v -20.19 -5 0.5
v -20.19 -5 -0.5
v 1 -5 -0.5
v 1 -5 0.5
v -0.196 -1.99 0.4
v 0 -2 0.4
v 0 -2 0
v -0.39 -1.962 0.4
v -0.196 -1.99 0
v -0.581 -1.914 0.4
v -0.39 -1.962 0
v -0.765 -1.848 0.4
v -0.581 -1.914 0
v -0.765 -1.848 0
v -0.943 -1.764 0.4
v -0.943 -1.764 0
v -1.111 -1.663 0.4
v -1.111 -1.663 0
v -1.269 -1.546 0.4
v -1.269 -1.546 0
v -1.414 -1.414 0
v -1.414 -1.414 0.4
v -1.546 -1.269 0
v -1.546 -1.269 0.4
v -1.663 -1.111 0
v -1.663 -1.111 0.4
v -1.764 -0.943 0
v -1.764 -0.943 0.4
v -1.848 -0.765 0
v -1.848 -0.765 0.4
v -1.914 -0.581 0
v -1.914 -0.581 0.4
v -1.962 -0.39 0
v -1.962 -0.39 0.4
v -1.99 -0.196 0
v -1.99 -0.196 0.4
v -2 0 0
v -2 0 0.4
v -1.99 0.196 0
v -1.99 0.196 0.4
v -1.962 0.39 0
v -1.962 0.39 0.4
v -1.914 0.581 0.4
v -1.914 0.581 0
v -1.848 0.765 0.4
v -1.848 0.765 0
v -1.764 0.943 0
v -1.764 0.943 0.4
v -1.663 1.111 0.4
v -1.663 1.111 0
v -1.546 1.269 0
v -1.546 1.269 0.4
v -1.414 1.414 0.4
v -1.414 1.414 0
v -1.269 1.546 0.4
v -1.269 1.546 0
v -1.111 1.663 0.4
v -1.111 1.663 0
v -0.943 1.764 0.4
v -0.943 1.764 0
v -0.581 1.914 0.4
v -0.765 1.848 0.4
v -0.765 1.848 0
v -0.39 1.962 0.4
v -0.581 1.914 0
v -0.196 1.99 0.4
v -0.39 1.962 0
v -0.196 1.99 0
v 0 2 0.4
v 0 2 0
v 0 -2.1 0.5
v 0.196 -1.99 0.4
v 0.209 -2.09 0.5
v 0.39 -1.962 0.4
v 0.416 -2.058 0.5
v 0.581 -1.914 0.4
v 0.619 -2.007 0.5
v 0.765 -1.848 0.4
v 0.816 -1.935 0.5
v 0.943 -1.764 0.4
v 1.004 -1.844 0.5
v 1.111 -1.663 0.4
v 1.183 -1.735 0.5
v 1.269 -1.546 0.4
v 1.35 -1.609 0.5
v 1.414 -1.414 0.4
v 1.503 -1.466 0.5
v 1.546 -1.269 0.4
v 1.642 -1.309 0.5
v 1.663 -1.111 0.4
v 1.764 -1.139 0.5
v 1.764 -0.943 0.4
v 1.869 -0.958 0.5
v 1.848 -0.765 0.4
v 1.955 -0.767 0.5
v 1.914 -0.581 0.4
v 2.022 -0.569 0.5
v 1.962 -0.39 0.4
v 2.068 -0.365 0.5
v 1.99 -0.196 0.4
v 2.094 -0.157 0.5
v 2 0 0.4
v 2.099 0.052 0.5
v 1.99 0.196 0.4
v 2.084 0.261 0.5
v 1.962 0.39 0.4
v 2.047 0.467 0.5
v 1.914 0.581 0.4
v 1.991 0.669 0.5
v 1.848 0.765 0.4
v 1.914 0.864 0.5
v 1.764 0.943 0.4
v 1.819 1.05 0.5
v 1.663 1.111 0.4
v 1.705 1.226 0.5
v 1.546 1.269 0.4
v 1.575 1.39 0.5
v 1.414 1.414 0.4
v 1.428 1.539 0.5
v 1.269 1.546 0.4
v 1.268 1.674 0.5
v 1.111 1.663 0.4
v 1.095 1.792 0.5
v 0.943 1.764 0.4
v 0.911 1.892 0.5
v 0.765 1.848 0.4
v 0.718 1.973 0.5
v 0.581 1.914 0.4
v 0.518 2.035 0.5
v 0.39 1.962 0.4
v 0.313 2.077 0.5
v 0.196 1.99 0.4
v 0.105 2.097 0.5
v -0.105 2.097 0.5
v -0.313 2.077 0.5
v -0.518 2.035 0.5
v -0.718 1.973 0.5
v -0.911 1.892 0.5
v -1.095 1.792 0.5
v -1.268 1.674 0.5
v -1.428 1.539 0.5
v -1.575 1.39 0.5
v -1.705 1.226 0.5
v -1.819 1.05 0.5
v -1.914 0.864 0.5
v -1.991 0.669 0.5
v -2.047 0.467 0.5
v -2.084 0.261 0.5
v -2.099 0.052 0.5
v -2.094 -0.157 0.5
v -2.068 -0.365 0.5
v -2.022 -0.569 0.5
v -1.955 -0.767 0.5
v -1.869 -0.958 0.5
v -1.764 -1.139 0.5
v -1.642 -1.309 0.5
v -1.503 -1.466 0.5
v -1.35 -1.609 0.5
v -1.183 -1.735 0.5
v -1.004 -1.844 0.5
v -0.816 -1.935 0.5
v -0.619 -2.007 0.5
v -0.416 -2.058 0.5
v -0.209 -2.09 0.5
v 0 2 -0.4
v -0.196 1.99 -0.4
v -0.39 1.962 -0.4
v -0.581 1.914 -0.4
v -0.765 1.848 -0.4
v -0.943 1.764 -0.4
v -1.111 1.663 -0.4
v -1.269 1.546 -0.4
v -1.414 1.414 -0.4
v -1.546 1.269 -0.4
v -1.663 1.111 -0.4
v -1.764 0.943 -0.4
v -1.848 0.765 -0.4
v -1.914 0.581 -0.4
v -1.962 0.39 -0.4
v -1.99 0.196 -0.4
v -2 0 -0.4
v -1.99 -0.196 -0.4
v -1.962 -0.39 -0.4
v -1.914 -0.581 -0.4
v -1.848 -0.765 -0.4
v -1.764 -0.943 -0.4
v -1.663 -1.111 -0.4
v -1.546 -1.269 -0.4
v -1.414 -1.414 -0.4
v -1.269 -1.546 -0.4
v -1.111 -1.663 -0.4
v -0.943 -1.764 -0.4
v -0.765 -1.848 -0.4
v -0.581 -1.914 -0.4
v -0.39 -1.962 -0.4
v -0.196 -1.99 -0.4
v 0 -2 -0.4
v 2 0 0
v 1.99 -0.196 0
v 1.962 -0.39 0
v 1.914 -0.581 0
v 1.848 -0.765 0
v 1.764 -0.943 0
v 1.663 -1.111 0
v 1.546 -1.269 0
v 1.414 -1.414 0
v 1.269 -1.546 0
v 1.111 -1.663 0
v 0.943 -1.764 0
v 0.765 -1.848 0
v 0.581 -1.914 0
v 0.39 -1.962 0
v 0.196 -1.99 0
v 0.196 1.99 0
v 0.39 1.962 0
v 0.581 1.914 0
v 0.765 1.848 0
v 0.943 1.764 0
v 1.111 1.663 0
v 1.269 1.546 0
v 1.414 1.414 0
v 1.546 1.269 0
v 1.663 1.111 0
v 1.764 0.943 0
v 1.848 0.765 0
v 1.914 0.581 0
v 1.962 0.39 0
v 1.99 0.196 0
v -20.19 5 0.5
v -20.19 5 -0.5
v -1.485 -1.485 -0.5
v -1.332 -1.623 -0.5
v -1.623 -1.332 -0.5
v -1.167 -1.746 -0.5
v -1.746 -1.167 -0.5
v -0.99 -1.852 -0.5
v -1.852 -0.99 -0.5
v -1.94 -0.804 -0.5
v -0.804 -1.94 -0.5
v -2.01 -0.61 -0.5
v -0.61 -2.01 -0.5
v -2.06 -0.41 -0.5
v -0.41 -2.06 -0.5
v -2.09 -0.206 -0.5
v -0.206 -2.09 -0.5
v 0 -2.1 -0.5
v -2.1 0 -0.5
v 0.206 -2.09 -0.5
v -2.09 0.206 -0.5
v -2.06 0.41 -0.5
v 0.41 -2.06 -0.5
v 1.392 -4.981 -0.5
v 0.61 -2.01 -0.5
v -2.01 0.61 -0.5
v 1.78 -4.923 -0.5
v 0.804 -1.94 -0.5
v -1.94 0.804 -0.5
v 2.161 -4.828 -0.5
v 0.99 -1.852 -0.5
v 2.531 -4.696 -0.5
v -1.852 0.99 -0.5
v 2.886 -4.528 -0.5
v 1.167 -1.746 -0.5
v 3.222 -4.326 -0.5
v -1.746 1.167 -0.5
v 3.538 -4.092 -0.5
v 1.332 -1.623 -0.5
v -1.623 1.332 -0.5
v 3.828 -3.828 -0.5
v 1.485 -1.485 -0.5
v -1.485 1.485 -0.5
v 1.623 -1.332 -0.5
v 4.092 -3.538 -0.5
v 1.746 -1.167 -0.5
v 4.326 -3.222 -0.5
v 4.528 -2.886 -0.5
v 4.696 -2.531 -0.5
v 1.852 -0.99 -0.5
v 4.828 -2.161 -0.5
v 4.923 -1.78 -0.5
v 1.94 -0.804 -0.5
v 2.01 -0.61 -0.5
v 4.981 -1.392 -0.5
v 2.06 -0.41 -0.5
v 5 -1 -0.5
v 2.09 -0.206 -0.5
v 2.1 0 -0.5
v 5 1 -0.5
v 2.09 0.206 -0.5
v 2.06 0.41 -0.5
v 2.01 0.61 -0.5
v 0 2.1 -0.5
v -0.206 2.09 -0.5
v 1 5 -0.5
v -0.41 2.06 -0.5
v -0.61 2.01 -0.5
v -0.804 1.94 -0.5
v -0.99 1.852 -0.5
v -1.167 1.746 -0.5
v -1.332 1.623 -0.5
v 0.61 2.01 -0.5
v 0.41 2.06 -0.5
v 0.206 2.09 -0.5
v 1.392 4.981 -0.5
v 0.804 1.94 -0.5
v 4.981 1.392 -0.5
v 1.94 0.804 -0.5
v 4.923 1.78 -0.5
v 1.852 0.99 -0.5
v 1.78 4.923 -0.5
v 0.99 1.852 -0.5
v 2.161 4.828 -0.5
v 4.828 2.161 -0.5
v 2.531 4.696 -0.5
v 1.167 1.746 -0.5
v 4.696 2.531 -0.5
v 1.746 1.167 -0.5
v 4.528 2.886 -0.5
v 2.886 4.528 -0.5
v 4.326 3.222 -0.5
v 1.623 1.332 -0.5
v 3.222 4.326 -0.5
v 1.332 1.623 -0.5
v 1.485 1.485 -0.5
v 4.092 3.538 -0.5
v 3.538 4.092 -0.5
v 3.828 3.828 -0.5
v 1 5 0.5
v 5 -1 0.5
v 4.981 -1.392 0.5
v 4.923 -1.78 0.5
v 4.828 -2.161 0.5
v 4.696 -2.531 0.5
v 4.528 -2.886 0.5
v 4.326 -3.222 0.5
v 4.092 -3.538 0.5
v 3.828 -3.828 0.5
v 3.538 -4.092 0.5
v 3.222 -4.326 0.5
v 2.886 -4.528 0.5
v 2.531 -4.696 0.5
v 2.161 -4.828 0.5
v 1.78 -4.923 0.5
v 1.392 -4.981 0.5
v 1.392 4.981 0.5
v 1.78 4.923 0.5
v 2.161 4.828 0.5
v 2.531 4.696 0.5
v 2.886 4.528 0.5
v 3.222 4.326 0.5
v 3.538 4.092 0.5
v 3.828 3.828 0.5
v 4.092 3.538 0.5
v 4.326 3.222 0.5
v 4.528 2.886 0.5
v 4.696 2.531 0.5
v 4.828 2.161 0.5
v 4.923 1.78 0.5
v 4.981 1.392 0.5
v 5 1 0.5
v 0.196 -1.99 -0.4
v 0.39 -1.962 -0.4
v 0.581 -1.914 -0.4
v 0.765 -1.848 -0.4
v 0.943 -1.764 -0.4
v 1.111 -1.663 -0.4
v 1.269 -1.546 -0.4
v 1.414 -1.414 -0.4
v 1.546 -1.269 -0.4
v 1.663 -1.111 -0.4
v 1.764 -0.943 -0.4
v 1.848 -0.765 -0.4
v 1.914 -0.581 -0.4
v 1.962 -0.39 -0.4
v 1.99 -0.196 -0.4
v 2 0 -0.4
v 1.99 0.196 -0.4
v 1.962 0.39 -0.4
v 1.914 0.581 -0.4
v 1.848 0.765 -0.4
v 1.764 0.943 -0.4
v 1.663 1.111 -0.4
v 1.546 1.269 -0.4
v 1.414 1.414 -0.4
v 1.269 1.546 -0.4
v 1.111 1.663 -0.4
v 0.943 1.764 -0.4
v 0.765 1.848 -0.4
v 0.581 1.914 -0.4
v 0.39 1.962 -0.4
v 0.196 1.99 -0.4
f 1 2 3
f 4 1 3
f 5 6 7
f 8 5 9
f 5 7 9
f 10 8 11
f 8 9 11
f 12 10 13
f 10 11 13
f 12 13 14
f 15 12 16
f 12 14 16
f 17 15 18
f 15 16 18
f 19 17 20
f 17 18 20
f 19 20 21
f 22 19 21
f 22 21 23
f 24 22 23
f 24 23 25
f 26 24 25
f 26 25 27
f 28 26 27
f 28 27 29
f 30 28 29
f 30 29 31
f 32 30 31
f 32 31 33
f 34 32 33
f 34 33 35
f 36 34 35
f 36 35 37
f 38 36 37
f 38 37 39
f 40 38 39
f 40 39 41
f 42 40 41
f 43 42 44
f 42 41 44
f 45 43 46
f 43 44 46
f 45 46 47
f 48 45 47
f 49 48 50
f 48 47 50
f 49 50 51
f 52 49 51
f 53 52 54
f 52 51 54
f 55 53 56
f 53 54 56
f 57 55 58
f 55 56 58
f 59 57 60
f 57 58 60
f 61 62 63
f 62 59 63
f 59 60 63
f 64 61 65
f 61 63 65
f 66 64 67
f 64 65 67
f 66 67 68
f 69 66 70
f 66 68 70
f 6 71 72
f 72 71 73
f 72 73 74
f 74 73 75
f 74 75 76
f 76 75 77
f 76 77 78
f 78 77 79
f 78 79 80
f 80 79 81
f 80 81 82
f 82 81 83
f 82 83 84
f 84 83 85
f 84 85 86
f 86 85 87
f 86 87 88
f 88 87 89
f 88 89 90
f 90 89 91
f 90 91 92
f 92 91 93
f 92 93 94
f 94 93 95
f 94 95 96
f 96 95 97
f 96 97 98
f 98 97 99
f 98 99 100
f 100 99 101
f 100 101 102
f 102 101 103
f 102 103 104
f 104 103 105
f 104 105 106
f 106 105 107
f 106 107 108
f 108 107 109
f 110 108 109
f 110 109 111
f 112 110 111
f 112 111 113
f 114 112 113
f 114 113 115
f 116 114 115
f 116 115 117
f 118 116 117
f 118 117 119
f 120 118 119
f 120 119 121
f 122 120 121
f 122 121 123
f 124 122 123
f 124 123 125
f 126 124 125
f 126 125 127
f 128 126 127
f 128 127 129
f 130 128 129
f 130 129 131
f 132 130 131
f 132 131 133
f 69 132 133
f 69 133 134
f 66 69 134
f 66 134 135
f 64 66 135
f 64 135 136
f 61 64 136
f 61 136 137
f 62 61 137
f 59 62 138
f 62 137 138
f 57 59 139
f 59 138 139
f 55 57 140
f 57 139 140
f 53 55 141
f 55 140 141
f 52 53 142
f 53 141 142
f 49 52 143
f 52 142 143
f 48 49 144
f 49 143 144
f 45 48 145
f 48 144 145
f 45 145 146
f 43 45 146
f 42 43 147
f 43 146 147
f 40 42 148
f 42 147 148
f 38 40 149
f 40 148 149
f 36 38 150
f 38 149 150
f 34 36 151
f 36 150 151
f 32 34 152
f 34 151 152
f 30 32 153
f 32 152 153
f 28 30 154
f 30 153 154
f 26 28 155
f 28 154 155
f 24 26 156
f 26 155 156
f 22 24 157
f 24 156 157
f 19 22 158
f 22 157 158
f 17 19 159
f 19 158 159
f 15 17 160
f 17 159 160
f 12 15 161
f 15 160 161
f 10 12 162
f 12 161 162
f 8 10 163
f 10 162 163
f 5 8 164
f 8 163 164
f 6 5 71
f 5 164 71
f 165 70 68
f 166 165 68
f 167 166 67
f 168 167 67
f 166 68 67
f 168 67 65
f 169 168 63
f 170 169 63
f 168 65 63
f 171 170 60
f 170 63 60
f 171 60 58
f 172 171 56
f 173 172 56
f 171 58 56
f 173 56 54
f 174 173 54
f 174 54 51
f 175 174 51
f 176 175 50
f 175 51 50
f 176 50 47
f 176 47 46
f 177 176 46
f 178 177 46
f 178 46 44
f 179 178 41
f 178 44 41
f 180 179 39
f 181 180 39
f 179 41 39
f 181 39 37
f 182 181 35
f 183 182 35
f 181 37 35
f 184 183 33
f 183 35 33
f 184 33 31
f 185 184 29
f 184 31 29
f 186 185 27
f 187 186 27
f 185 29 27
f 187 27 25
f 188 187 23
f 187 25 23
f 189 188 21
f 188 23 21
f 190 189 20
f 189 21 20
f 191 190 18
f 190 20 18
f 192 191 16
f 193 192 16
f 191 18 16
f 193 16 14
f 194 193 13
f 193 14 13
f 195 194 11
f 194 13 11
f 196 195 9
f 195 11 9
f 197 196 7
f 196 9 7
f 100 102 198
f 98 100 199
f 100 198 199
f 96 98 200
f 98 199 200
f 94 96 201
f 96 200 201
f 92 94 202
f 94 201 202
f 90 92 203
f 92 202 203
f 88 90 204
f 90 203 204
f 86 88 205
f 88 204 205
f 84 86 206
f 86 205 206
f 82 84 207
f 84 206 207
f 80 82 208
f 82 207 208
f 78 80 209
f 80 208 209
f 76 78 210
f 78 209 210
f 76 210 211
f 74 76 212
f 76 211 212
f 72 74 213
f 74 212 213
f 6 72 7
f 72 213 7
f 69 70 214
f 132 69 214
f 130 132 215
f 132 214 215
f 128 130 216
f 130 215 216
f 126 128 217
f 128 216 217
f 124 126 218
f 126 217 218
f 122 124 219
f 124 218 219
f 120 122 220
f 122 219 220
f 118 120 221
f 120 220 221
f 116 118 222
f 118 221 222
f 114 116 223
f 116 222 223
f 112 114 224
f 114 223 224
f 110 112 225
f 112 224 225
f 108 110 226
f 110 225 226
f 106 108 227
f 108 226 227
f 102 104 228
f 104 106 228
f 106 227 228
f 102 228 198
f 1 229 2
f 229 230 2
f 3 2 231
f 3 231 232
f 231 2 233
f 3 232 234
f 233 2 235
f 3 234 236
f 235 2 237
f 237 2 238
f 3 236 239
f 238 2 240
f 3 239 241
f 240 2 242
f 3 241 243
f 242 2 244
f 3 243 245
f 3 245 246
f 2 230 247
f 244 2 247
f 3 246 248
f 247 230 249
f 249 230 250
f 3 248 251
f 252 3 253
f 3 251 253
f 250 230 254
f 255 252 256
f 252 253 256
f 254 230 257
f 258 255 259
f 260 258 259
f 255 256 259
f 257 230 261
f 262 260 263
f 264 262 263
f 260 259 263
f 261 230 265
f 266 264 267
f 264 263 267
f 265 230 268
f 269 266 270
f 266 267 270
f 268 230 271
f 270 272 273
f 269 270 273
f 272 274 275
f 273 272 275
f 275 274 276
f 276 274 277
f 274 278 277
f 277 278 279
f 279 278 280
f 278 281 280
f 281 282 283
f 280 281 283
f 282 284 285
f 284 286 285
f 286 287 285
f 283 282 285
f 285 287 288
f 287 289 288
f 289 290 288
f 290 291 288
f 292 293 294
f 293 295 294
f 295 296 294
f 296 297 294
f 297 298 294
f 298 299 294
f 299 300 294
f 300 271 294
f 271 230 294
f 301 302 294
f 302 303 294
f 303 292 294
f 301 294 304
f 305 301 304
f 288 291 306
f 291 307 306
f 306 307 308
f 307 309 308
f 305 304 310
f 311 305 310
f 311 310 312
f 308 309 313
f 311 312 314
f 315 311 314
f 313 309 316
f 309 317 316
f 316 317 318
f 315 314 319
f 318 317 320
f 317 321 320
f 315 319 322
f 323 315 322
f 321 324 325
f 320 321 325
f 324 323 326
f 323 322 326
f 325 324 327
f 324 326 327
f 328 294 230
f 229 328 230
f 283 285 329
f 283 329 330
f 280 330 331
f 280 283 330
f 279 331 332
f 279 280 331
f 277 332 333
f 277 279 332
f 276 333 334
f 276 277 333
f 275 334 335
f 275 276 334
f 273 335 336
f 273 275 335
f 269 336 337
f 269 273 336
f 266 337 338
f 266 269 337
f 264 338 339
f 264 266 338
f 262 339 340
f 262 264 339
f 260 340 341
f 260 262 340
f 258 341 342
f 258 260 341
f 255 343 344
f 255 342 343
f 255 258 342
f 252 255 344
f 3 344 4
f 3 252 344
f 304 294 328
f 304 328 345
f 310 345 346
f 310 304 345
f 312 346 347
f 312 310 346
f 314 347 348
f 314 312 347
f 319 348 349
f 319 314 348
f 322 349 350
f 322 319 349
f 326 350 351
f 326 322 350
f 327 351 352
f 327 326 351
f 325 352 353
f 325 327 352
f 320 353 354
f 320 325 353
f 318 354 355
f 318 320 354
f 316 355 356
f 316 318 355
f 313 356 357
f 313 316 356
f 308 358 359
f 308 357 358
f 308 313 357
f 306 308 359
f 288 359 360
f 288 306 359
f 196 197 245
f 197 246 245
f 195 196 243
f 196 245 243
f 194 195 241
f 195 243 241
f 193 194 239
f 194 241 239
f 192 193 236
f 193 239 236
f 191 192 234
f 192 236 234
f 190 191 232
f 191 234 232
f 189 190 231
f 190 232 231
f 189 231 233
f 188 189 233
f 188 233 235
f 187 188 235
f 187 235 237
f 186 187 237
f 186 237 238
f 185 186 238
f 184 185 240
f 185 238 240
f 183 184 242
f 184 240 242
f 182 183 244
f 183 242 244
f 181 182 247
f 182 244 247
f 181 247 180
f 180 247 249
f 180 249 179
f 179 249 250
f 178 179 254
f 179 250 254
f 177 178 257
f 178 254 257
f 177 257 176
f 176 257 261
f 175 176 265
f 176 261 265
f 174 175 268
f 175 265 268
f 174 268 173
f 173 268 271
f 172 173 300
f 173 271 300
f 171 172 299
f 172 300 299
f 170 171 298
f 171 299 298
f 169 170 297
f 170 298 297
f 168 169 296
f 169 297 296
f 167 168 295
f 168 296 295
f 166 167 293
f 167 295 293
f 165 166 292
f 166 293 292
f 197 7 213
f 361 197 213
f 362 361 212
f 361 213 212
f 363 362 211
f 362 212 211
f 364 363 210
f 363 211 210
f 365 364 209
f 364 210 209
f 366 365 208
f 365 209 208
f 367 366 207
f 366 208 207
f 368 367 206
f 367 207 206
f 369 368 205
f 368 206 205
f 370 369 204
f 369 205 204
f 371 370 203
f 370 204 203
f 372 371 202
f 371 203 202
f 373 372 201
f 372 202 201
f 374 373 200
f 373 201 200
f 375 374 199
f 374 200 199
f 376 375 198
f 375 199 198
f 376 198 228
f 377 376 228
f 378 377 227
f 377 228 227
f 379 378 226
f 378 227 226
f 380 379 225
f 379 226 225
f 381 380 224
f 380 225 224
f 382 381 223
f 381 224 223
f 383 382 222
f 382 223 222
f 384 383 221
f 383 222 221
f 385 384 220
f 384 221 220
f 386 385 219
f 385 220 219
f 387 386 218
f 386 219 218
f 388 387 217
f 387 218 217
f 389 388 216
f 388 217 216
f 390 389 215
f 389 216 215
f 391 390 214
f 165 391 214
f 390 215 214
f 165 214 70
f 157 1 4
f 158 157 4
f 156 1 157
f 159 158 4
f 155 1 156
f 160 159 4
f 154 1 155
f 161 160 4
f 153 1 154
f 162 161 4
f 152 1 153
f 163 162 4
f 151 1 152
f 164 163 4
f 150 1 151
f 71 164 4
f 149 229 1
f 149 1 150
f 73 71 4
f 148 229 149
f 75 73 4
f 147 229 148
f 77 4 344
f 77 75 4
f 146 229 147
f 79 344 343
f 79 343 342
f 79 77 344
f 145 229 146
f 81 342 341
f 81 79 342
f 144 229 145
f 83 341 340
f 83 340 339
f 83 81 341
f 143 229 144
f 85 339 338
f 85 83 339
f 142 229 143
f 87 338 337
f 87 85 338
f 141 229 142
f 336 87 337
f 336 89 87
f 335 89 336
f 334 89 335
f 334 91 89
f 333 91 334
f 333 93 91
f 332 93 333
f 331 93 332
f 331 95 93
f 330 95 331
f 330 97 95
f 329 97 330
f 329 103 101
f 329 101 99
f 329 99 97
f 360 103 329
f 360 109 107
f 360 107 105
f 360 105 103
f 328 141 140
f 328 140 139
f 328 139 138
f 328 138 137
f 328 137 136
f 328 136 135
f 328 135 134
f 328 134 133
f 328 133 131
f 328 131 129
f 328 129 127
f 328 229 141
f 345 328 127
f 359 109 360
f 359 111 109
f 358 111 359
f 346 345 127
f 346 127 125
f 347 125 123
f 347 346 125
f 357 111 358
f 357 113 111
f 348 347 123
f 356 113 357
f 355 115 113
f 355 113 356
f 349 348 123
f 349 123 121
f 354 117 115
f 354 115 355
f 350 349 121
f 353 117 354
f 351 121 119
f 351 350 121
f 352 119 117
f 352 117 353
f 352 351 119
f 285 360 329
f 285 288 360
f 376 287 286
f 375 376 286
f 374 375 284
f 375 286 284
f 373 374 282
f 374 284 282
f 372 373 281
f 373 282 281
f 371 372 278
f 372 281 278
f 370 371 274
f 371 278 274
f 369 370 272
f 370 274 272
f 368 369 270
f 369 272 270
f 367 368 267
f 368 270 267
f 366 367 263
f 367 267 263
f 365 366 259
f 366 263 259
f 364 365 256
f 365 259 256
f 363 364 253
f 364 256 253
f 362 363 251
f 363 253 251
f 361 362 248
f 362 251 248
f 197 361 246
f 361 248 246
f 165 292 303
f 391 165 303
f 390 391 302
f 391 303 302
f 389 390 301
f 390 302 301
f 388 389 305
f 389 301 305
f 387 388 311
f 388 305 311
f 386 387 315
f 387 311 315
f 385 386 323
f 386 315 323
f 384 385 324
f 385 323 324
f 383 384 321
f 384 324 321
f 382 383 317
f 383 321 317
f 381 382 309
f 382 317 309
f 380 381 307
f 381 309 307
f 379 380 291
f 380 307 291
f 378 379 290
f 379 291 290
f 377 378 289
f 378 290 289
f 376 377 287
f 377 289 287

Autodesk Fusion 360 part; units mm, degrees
sketch "Sketch1" plane through (0, 0, 0) normal (0, 0, 1) x (1, 0, 0)
  line L0 (-20.19, -5) -> (0, -5)
  line L1 (0, -5) -> (0, 5)
  line L2 (0, 5) -> (-20.19, 5)
  line L3 (-20.19, 5) -> (-20.19, -5)
  line L4 (0, 5) -> (1, 5)
  line L5 (5, 1) -> (5, -1)
  line L6 (1, -5) -> (0, -5)
  line L7 (0, -5) -> (0, 5)
  arc A0 (1, -5) -> (5, -1) centre (1, -1) ccw
  arc A1 (5, 1) -> (1, 5) centre (1, 1) ccw
  circle A2 centre (0, 0) radius 2
  point P0 (5, 5)
  dimension "d1" = 20.19
  dimension "d2" = 10
  dimension "d3" = 5
  dimension "d5" = 4
  dimension "d6" = 4
  dimension "d7" = 4
extrude "Extrude1" add sketch "Sketch1" along normal mid plane 1 contours L0 L1 L2 L3 L7 A2 | L1 L4 L5 L6 L7 A0 A1 A2
chamfer "Chamfer1" distance 0.1 angle 45 2 edges at (-1.8647, 0.7232, 0.5) (-1.8647, -0.7232, -0.5)
